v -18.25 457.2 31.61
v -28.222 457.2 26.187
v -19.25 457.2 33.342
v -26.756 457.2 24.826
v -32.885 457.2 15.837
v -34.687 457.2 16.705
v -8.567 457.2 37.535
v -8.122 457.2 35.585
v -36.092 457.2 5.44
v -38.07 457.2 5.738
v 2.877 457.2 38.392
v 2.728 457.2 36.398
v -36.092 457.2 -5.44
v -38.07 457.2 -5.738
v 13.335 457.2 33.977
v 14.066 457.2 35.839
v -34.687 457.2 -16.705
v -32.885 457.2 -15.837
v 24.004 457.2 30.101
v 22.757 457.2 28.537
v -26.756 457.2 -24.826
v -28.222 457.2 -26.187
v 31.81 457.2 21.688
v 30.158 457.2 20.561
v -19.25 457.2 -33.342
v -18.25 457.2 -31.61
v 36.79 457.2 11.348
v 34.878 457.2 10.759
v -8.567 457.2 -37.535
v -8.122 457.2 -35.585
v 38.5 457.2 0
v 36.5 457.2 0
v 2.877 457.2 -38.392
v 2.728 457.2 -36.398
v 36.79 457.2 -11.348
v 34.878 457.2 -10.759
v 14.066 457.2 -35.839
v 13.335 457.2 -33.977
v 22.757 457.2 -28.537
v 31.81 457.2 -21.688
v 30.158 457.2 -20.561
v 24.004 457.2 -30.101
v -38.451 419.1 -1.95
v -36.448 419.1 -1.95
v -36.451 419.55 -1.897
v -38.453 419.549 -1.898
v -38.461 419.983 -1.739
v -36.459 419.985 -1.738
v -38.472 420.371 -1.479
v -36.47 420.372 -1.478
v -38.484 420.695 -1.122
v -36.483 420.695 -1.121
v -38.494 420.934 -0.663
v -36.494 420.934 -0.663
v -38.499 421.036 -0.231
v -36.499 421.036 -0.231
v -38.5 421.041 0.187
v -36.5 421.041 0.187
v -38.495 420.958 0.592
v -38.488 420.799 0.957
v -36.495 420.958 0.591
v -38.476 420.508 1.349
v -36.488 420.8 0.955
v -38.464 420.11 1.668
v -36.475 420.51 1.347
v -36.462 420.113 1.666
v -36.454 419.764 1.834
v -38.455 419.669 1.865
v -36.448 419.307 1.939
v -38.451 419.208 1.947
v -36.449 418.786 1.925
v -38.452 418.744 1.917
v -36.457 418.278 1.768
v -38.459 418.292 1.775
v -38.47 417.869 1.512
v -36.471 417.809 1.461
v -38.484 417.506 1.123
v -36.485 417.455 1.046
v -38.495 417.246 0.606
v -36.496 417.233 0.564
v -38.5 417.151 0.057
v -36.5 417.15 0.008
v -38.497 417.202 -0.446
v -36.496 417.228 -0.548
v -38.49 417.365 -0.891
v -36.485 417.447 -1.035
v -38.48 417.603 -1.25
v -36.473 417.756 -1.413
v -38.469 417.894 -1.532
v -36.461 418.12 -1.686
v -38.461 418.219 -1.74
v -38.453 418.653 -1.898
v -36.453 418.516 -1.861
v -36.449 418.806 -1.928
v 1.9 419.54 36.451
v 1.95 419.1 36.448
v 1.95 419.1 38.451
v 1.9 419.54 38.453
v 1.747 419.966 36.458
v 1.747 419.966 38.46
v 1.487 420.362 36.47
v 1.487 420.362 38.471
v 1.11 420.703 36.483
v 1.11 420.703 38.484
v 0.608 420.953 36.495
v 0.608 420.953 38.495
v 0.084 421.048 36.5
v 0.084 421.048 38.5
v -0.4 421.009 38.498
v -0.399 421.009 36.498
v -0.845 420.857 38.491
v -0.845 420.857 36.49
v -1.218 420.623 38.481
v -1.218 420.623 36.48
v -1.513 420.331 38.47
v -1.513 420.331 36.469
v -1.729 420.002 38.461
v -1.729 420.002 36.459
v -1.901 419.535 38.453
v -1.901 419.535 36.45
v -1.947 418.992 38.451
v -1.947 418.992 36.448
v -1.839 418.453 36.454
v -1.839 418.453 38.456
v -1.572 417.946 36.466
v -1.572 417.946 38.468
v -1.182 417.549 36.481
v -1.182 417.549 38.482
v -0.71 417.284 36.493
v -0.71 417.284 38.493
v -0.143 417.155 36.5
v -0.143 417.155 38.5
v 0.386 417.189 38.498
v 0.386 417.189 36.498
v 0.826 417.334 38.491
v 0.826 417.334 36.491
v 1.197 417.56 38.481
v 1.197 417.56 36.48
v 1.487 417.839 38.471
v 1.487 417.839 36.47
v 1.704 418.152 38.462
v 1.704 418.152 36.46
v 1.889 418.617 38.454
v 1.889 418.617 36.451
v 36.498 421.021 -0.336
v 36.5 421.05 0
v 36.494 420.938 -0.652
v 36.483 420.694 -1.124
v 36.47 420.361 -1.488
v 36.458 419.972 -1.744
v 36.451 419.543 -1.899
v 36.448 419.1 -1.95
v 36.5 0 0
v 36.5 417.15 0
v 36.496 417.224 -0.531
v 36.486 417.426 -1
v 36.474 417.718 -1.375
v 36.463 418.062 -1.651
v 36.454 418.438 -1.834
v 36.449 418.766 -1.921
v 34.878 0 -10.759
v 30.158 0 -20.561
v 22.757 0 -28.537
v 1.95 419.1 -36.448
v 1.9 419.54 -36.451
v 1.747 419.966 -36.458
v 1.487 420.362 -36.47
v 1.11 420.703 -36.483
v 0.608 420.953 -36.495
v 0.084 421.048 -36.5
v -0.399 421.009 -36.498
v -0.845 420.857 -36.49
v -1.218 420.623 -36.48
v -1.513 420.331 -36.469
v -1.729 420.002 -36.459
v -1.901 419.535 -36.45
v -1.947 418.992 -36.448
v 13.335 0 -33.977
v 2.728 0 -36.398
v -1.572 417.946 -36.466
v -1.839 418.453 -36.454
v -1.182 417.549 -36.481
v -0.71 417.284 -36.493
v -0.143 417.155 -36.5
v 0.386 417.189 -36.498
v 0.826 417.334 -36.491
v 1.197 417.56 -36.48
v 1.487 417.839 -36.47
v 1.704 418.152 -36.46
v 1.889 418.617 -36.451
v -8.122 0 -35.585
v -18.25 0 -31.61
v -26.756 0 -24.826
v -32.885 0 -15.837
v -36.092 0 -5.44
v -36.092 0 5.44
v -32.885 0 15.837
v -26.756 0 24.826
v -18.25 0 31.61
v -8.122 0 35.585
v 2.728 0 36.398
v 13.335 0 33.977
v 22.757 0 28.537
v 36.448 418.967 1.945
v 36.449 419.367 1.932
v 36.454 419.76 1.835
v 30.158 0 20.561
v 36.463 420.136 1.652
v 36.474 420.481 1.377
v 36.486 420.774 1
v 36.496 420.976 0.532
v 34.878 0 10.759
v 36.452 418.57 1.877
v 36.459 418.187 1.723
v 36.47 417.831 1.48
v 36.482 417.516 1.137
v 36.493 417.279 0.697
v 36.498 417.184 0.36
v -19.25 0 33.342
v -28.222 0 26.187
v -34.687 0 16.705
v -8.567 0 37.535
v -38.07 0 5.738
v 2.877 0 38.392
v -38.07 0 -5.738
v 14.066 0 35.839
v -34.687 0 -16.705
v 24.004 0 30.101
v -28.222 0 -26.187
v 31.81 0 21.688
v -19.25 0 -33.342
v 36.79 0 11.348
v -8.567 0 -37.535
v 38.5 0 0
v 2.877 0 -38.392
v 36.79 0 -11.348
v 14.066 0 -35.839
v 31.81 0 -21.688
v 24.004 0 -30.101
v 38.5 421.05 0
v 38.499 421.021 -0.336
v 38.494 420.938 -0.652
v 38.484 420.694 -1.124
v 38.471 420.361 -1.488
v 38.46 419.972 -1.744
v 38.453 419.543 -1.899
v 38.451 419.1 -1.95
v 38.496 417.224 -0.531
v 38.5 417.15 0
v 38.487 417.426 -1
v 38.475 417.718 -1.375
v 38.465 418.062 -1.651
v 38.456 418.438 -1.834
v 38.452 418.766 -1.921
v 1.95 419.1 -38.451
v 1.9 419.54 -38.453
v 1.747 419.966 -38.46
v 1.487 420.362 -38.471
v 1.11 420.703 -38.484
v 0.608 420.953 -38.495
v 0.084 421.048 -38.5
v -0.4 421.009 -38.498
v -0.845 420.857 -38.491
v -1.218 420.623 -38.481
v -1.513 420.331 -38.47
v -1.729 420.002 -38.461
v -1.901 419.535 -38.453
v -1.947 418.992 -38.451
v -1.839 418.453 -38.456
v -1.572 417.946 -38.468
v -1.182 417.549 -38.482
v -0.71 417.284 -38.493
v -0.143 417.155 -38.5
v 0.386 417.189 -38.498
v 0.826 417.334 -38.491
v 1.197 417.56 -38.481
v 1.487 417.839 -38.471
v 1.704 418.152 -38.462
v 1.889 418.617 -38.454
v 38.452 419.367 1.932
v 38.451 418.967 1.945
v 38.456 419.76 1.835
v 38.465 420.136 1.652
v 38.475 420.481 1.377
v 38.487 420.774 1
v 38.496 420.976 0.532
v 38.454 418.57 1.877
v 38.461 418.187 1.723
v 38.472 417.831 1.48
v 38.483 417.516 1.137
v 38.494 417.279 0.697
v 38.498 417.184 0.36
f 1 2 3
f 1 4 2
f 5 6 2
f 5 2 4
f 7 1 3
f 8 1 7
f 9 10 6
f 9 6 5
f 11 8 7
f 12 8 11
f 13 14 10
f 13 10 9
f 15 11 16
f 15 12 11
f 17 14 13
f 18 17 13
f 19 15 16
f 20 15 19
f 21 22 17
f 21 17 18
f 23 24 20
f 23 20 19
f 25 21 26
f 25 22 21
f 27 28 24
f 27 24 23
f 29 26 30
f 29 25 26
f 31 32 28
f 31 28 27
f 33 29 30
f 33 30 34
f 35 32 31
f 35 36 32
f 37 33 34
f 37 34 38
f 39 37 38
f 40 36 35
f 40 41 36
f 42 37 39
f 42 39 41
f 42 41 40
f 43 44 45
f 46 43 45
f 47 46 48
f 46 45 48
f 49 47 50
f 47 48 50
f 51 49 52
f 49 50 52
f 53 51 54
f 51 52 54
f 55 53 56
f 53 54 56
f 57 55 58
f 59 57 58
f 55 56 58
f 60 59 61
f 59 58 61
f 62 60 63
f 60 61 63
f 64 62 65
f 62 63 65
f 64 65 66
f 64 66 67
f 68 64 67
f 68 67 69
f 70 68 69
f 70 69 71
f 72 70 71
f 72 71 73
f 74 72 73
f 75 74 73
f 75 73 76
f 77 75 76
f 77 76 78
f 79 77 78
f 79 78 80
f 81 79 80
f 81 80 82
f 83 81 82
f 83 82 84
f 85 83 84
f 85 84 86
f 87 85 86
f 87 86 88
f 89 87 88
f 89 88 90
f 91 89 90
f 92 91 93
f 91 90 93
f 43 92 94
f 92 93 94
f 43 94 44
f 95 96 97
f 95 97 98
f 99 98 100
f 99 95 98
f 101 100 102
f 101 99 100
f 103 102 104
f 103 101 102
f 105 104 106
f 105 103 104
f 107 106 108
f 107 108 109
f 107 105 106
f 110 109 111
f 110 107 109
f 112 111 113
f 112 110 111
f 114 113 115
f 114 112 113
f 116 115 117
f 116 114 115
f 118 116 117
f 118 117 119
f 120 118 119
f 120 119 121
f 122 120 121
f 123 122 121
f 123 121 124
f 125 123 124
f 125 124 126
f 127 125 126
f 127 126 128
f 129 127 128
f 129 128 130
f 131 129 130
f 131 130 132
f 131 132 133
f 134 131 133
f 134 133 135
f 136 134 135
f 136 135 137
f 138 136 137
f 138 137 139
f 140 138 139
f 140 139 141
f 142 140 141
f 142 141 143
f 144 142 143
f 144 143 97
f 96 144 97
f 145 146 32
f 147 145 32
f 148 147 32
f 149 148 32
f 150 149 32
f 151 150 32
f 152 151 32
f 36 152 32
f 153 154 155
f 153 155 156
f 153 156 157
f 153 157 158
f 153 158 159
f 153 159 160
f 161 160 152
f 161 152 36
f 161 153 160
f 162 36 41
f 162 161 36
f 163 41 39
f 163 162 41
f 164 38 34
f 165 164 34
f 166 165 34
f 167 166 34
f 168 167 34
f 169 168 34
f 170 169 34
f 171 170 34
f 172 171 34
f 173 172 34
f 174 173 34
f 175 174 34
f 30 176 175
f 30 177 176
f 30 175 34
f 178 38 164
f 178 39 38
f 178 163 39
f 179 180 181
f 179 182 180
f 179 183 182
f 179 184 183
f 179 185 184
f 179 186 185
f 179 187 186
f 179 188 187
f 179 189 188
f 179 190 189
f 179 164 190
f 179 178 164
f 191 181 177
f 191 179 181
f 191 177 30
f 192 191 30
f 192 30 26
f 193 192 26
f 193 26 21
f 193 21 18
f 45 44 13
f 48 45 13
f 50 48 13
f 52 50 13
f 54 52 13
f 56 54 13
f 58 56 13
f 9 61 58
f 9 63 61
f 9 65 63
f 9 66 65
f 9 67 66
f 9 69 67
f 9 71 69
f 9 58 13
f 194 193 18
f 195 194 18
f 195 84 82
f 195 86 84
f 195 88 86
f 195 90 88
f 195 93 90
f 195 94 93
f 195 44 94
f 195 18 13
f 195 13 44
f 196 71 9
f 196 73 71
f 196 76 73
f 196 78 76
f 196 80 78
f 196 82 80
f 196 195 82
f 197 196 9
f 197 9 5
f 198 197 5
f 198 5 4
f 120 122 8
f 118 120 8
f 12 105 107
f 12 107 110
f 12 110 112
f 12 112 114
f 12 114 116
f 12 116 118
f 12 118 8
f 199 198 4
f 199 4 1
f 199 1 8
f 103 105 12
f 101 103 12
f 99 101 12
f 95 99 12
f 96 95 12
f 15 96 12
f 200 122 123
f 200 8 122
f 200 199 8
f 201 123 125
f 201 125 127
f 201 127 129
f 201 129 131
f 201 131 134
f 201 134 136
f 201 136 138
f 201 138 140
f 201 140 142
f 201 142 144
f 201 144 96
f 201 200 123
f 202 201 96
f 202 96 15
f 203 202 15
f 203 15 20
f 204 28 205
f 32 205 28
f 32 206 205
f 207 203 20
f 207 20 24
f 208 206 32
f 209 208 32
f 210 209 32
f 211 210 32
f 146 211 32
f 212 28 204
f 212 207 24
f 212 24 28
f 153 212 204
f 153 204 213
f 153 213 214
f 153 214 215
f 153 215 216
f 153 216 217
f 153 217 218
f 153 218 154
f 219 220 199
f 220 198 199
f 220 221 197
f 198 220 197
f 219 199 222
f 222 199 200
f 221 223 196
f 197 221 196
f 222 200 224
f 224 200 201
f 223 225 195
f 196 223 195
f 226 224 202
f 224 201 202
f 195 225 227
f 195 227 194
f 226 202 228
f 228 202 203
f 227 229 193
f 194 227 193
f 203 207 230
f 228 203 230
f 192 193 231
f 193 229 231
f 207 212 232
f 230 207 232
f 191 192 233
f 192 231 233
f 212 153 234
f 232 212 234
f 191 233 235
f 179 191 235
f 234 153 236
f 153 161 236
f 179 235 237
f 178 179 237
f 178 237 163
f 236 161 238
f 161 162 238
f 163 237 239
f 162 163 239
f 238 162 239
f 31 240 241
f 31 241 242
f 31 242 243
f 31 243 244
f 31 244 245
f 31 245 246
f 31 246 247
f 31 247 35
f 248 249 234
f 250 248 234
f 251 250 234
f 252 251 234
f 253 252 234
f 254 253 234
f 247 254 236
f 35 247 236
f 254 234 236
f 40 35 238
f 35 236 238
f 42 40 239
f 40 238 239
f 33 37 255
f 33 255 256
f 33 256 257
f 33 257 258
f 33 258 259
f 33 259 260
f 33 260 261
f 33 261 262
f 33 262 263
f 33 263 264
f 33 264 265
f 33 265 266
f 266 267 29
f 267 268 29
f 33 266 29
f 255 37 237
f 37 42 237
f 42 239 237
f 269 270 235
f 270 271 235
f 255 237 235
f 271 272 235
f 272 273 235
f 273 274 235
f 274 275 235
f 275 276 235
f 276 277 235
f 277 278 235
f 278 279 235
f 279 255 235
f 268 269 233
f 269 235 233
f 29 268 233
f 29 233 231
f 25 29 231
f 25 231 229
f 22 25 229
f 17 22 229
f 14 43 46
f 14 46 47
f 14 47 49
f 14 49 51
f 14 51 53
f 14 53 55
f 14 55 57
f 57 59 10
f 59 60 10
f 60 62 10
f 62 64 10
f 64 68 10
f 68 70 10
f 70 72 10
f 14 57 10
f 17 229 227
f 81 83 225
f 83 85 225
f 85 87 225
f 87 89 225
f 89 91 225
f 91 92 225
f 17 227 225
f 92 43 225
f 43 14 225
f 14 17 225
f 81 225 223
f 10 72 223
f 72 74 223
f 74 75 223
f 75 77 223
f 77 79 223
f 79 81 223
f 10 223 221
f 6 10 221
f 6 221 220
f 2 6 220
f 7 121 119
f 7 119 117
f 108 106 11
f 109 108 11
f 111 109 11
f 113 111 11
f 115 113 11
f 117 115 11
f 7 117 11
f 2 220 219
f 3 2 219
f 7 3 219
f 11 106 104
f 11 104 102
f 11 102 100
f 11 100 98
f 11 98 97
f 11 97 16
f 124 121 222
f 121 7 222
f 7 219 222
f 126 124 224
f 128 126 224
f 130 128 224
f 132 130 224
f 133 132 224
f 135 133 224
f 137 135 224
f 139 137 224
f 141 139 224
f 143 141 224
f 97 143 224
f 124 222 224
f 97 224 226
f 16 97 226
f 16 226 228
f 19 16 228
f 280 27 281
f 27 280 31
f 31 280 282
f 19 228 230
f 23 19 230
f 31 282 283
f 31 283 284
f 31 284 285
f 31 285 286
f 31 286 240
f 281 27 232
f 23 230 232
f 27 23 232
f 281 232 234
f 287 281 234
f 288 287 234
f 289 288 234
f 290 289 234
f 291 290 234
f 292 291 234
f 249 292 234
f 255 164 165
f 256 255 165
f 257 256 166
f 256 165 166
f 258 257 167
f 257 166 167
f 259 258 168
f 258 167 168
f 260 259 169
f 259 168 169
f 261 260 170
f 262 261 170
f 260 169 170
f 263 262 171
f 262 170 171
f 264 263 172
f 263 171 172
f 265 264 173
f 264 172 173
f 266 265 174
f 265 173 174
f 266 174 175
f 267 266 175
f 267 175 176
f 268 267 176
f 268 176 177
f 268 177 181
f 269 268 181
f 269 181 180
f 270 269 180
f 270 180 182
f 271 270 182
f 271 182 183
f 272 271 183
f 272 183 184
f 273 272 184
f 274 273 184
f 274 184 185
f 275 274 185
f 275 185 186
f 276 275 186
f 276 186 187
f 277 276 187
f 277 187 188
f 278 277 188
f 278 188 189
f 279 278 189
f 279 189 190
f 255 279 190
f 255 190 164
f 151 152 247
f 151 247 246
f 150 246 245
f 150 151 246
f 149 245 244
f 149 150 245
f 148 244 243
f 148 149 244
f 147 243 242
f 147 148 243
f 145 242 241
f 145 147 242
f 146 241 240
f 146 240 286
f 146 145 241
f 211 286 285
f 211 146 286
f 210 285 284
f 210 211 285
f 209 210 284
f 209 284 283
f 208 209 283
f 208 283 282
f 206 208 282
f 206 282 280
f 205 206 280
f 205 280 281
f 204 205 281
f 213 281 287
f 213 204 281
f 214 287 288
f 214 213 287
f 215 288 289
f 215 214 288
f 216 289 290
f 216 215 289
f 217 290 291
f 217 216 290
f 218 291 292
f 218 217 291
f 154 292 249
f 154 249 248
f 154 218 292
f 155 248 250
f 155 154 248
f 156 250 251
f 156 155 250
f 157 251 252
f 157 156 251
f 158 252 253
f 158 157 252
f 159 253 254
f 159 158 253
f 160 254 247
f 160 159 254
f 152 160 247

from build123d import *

# Parameters (mm, degrees)
SKETCH1_R               = 38.5
SKETCH1_R_2             = 36.5
BOSS_EXTRUDE1_DEPTH     = 457.2
SKETCH2_R               = 1.95
CUT_EXTRUDE1_DEPTH      = 39.5
CUT_EXTRUDE1_DEPTH_BACK = 39.5
SKETCH3_R               = 1.95
CUT_EXTRUDE2_DEPTH      = 39.5000001
CUT_EXTRUDE2_DEPTH_BACK = 39.5000001


with BuildPart() as part:
    # Sketch1 → Boss-Extrude1 (new body)
    with BuildSketch(Plane(origin=(0, 0, 0), x_dir=(1, 0, 0), z_dir=(0, 1, 0))):
        Circle(SKETCH1_R)
        Circle(SKETCH1_R_2, mode=Mode.SUBTRACT)
    extrude(amount=BOSS_EXTRUDE1_DEPTH)

    # Sketch2 → Cut-Extrude1 (cut, two sides)
    with BuildSketch(Plane(origin=(0, 0, 0), x_dir=(0, 0, -1), z_dir=(1, 0, 0))) as cut_extrude1_sk:
        with Locations((0, 419.1)):
            Circle(SKETCH2_R)
    extrude(amount=CUT_EXTRUDE1_DEPTH, mode=Mode.SUBTRACT)
    extrude(cut_extrude1_sk.sketch, amount=-CUT_EXTRUDE1_DEPTH_BACK, mode=Mode.SUBTRACT)

    # Sketch3 → Cut-Extrude2 (cut, two sides)
    with BuildSketch(Plane.XY) as cut_extrude2_sk:
        with Locations((0, 419.1)):
            Circle(SKETCH3_R)
    extrude(amount=CUT_EXTRUDE2_DEPTH, mode=Mode.SUBTRACT)
    extrude(cut_extrude2_sk.sketch, amount=-CUT_EXTRUDE2_DEPTH_BACK, mode=Mode.SUBTRACT)


solid = part.part
